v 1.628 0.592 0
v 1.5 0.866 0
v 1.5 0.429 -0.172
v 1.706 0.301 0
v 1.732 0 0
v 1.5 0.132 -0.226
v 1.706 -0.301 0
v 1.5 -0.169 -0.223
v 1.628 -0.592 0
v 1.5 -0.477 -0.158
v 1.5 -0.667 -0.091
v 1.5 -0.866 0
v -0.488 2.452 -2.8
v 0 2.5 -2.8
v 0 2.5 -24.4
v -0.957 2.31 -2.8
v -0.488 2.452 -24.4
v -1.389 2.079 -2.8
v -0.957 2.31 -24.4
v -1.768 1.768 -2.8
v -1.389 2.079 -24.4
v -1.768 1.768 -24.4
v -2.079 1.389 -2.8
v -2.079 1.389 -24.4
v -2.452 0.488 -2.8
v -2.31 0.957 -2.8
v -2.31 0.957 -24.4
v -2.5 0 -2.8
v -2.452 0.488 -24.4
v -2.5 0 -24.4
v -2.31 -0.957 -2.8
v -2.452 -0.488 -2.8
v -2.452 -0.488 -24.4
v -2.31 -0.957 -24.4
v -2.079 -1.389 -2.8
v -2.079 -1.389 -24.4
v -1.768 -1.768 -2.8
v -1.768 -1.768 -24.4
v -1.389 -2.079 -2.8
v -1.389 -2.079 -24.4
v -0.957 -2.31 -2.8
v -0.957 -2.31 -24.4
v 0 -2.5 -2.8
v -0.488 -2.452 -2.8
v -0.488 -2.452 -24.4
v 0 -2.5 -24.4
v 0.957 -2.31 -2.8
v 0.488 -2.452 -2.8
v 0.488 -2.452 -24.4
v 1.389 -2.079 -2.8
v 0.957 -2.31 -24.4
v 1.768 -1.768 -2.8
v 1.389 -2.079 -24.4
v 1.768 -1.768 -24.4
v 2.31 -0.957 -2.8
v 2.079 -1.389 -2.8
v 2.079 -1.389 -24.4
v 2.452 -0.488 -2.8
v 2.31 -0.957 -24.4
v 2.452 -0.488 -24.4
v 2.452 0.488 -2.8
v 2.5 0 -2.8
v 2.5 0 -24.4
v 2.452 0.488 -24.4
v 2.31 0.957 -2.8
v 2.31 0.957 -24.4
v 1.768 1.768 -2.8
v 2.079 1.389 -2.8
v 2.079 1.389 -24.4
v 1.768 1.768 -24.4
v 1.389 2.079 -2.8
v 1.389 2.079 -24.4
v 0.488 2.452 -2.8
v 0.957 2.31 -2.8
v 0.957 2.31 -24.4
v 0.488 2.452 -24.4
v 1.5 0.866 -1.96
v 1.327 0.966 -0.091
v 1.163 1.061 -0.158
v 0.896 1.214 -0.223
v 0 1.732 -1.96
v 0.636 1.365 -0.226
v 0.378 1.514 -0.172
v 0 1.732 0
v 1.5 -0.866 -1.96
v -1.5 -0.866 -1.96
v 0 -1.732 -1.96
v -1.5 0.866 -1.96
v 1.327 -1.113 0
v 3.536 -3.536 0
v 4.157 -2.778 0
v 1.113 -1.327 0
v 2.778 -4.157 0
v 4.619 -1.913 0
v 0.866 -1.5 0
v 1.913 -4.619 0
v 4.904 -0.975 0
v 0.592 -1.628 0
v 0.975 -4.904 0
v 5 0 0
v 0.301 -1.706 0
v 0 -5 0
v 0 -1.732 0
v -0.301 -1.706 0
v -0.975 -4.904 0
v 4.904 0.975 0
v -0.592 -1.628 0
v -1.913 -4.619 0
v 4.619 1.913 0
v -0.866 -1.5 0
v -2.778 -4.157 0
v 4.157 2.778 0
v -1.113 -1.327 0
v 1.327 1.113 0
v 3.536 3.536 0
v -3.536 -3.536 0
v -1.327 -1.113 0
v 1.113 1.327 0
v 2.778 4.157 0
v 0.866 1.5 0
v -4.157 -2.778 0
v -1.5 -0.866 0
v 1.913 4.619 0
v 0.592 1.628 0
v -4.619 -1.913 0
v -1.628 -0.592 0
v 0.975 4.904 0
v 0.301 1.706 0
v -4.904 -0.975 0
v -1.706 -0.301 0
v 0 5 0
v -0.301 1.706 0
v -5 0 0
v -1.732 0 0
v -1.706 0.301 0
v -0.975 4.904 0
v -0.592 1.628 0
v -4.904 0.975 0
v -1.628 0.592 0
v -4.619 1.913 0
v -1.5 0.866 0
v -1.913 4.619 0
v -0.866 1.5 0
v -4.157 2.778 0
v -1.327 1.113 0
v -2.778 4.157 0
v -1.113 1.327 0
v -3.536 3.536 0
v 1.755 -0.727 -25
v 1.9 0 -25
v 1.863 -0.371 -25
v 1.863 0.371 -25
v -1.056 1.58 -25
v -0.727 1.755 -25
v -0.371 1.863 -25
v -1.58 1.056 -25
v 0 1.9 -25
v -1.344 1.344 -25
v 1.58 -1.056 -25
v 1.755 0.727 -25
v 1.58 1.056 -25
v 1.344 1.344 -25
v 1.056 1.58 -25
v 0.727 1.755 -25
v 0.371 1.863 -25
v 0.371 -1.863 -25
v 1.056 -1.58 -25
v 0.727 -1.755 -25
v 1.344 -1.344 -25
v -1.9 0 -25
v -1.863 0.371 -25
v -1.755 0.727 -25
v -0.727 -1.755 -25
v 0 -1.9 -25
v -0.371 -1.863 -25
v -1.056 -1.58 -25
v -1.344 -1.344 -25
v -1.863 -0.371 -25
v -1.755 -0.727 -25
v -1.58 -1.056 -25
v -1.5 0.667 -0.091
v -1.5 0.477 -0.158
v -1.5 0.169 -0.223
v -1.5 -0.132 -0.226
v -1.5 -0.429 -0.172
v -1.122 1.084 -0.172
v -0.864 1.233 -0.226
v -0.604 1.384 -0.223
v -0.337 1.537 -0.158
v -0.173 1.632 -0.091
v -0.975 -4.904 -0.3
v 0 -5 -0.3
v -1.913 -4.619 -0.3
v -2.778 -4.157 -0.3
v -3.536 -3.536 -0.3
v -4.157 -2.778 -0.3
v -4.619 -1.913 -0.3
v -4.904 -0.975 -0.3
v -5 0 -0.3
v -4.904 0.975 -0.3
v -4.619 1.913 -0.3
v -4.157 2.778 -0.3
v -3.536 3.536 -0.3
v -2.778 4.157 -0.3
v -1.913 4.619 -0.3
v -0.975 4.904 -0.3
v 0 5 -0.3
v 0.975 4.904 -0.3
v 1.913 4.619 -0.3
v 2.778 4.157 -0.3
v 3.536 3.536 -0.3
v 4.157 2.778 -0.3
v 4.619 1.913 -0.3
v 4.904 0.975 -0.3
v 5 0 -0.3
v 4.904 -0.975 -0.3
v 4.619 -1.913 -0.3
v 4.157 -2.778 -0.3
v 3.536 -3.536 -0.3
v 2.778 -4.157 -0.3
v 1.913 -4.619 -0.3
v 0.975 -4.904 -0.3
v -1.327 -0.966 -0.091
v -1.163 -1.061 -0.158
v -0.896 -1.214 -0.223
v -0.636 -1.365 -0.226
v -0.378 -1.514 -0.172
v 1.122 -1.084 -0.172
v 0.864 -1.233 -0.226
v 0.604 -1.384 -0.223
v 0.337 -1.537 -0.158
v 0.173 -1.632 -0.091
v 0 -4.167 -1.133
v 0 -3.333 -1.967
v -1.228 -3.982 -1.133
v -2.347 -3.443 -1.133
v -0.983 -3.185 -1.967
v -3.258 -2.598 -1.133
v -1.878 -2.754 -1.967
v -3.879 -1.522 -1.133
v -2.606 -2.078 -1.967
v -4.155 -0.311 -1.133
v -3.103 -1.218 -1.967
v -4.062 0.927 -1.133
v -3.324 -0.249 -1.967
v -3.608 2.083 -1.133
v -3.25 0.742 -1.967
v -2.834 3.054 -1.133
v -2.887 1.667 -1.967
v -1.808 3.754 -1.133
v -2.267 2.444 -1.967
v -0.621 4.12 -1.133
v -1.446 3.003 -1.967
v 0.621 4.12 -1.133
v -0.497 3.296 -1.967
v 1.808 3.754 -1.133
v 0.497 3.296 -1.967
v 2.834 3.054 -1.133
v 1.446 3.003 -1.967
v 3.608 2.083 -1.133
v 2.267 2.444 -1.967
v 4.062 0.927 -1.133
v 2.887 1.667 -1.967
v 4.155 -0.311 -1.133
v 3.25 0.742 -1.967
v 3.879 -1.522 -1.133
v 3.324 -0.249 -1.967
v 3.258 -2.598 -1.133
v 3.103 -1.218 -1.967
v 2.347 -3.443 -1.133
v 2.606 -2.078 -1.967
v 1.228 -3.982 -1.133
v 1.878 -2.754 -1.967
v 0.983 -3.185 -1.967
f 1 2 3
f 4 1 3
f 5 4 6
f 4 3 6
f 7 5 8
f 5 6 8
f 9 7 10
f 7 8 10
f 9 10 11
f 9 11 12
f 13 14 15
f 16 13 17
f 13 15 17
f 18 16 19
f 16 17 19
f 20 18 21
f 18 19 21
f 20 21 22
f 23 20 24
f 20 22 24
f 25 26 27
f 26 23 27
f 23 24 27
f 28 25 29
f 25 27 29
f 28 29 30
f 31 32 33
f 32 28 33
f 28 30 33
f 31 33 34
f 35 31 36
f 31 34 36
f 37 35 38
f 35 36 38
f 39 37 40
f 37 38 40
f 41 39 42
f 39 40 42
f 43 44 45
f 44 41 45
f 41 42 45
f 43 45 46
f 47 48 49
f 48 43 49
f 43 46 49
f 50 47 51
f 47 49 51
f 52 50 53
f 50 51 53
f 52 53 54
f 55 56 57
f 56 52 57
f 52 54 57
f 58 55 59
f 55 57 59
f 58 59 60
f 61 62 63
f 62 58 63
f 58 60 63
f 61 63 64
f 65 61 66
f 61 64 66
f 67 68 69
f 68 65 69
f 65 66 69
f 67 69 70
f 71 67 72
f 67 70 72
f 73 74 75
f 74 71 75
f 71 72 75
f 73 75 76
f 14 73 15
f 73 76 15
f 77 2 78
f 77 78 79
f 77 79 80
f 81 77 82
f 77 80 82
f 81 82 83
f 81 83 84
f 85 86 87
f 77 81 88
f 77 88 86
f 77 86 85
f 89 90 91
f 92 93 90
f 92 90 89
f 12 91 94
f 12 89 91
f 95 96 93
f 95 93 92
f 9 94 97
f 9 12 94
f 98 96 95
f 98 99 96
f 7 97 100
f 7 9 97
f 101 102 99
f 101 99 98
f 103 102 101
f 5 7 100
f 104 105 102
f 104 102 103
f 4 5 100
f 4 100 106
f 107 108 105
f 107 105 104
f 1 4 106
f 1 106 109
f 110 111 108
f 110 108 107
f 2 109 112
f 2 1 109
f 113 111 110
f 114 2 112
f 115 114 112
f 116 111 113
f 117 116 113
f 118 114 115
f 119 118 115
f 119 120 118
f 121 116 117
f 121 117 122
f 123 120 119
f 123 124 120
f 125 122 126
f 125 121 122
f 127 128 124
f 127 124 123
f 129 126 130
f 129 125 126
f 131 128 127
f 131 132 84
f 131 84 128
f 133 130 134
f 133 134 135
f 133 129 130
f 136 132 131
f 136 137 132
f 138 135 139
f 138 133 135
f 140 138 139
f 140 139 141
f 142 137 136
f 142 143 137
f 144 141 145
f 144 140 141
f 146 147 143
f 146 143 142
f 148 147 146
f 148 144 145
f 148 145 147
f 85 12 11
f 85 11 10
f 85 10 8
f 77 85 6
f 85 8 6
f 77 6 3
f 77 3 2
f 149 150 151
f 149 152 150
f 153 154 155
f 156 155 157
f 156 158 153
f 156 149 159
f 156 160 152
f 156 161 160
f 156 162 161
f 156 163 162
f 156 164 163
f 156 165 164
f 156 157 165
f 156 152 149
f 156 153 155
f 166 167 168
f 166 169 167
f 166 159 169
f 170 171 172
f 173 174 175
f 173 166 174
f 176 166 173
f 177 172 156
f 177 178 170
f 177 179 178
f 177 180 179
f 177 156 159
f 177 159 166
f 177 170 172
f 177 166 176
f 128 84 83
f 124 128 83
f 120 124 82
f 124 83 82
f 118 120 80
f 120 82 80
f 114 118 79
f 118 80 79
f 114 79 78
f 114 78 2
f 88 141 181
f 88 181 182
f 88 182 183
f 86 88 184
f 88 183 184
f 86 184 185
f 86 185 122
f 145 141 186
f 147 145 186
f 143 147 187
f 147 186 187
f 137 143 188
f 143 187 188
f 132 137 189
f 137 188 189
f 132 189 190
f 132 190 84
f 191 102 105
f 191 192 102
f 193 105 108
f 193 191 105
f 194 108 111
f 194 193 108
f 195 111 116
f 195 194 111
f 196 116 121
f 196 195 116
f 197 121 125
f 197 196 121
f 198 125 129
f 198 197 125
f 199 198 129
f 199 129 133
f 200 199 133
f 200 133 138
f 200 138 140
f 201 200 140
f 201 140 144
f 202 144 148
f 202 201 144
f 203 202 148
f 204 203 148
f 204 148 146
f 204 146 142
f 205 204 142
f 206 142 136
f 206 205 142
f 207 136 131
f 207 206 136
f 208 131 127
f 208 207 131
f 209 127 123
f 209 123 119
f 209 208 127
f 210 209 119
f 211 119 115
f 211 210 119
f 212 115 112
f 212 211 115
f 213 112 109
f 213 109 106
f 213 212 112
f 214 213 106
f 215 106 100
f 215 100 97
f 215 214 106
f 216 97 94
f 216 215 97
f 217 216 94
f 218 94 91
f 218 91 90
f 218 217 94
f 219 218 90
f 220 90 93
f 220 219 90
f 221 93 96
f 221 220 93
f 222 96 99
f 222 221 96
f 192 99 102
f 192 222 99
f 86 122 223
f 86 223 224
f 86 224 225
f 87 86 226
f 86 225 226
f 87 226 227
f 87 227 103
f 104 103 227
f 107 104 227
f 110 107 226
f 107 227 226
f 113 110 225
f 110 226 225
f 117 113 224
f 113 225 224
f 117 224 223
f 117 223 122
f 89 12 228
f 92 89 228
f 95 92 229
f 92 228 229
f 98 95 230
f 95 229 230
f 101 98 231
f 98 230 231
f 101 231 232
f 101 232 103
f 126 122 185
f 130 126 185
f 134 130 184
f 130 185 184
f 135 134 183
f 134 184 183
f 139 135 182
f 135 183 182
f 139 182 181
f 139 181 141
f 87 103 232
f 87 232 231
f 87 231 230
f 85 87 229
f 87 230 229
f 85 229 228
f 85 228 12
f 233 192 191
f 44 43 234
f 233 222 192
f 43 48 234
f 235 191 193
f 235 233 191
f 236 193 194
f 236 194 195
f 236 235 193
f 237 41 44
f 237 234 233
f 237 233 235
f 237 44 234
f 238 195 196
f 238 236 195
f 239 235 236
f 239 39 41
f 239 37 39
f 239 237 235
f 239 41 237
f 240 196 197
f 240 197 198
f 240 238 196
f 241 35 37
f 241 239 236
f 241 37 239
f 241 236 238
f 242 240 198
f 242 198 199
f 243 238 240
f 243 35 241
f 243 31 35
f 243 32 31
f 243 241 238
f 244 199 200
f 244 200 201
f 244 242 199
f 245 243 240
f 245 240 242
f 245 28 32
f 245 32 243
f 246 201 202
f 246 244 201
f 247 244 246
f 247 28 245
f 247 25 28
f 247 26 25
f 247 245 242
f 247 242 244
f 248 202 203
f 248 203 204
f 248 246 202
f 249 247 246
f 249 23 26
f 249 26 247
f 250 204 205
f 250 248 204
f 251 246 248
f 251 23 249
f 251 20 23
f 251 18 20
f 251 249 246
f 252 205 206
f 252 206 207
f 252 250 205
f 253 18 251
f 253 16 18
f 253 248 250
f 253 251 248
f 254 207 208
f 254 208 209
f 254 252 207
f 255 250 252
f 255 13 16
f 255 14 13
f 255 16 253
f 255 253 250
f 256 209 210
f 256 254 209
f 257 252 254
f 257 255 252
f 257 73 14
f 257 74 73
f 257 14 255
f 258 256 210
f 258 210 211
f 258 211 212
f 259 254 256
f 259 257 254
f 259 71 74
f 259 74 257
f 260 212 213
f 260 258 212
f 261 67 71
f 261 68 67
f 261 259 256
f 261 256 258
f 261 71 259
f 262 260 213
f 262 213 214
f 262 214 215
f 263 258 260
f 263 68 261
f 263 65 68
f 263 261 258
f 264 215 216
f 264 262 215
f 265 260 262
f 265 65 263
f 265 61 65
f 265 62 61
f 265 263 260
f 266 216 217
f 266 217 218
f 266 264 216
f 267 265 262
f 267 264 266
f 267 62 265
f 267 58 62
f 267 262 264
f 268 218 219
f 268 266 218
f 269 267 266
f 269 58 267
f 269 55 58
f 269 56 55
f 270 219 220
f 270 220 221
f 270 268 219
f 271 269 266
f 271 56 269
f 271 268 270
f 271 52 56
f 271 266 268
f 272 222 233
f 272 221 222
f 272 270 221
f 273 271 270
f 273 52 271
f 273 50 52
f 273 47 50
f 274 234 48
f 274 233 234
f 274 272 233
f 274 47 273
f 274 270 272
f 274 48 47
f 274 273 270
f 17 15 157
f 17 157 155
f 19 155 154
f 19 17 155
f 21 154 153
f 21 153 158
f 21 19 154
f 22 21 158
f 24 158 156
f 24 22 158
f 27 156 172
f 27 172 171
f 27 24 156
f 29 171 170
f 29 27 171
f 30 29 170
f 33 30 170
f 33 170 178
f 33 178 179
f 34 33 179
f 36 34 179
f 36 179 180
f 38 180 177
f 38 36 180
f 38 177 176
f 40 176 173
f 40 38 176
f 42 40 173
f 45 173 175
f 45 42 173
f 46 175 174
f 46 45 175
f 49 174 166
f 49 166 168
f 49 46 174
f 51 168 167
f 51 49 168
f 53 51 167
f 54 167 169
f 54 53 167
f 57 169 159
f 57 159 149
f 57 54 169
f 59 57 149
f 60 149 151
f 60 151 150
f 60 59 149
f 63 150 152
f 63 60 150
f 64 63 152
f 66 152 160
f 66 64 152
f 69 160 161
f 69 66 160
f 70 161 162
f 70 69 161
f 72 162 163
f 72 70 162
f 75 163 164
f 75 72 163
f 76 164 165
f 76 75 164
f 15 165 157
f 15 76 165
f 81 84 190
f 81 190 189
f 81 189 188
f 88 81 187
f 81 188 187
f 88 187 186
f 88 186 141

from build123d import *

# Parameters (mm, degrees)
SKETCH1_W          = 25
SKETCH1_H          = 2.5
CHAMFER1_SIZE      = 0.6
CUT_EXTRUDE2_DEPTH = 1.96


with BuildPart() as part:
    # Sketch1 → Revolve1 (revolve)
    with BuildSketch(Plane(origin=(0, 0, 0), x_dir=(0, 0, -1), z_dir=(1, 0, 0))):
        with Locations((12.5, 1.25)):
            Rectangle(SKETCH1_W, SKETCH1_H)
    revolve(axis=Axis((0, 0, -25), (0, 0, 1)))

    # Chamfer1
    chamfer1_edges = [part.edges().sort_by_distance(p)[0] for p in [
        (0, -2.5, -25),
    ]]
    chamfer(chamfer1_edges, length=CHAMFER1_SIZE)

    # Sketch7 → Revolve2 (revolve)
    with BuildSketch(Plane(origin=(0, 0, 0), x_dir=(0, 0, -1), z_dir=(1, 0, 0)), mode=Mode.PRIVATE) as revolve2_sk:
        Polygon((0, 5), (0.3, 5), (2.8, 2.5), (2.8, 0), (0, 0), align=None)
    revolve(revolve2_sk.sketch.rotate(Axis((0, 0, 0), (0, 0, -1)), 180), axis=Axis((0, 0, 0), (0, 0, -1)))

    # Boss-Extrude1 cone 1 section (through the dimple's axis) → Boss-Extrude1 (revolve)
    with BuildSketch(Plane(origin=(0, 0, -2.8), x_dir=(0, -1, 0), z_dir=(1, 0, 0))):
        Polygon((0, 0), (2.5, 0), (0, 2.5), align=None)
    revolve(axis=Axis((0, 0, -2.8), (0, 0, -1)))

    # Sketch5 → Cut-Extrude2 (cut)
    with BuildSketch(Plane.XY):
        Polygon((1.5, -0.866025404), (1.5, 0.866025404), (0, 1.732050808), (-1.5, 0.866025404), (-1.5, -0.866025404), (0, -1.732050808), align=None)
    extrude(amount=-CUT_EXTRUDE2_DEPTH, mode=Mode.SUBTRACT)

    # Cut-Extrude3 cone 1 section (through the dimple's axis) → Cut-Extrude3 (revolve, cut)
    with BuildSketch(Plane(origin=(0, 0, 0), x_dir=(0, -1, 0), z_dir=(1, 0, 0))):
        Polygon((0, 0), (1.732050808, 0), (0, 1.732050808), align=None)
    revolve(axis=Axis((0, 0, 0), (0, 0, -1)), mode=Mode.SUBTRACT)


solid = part.part
